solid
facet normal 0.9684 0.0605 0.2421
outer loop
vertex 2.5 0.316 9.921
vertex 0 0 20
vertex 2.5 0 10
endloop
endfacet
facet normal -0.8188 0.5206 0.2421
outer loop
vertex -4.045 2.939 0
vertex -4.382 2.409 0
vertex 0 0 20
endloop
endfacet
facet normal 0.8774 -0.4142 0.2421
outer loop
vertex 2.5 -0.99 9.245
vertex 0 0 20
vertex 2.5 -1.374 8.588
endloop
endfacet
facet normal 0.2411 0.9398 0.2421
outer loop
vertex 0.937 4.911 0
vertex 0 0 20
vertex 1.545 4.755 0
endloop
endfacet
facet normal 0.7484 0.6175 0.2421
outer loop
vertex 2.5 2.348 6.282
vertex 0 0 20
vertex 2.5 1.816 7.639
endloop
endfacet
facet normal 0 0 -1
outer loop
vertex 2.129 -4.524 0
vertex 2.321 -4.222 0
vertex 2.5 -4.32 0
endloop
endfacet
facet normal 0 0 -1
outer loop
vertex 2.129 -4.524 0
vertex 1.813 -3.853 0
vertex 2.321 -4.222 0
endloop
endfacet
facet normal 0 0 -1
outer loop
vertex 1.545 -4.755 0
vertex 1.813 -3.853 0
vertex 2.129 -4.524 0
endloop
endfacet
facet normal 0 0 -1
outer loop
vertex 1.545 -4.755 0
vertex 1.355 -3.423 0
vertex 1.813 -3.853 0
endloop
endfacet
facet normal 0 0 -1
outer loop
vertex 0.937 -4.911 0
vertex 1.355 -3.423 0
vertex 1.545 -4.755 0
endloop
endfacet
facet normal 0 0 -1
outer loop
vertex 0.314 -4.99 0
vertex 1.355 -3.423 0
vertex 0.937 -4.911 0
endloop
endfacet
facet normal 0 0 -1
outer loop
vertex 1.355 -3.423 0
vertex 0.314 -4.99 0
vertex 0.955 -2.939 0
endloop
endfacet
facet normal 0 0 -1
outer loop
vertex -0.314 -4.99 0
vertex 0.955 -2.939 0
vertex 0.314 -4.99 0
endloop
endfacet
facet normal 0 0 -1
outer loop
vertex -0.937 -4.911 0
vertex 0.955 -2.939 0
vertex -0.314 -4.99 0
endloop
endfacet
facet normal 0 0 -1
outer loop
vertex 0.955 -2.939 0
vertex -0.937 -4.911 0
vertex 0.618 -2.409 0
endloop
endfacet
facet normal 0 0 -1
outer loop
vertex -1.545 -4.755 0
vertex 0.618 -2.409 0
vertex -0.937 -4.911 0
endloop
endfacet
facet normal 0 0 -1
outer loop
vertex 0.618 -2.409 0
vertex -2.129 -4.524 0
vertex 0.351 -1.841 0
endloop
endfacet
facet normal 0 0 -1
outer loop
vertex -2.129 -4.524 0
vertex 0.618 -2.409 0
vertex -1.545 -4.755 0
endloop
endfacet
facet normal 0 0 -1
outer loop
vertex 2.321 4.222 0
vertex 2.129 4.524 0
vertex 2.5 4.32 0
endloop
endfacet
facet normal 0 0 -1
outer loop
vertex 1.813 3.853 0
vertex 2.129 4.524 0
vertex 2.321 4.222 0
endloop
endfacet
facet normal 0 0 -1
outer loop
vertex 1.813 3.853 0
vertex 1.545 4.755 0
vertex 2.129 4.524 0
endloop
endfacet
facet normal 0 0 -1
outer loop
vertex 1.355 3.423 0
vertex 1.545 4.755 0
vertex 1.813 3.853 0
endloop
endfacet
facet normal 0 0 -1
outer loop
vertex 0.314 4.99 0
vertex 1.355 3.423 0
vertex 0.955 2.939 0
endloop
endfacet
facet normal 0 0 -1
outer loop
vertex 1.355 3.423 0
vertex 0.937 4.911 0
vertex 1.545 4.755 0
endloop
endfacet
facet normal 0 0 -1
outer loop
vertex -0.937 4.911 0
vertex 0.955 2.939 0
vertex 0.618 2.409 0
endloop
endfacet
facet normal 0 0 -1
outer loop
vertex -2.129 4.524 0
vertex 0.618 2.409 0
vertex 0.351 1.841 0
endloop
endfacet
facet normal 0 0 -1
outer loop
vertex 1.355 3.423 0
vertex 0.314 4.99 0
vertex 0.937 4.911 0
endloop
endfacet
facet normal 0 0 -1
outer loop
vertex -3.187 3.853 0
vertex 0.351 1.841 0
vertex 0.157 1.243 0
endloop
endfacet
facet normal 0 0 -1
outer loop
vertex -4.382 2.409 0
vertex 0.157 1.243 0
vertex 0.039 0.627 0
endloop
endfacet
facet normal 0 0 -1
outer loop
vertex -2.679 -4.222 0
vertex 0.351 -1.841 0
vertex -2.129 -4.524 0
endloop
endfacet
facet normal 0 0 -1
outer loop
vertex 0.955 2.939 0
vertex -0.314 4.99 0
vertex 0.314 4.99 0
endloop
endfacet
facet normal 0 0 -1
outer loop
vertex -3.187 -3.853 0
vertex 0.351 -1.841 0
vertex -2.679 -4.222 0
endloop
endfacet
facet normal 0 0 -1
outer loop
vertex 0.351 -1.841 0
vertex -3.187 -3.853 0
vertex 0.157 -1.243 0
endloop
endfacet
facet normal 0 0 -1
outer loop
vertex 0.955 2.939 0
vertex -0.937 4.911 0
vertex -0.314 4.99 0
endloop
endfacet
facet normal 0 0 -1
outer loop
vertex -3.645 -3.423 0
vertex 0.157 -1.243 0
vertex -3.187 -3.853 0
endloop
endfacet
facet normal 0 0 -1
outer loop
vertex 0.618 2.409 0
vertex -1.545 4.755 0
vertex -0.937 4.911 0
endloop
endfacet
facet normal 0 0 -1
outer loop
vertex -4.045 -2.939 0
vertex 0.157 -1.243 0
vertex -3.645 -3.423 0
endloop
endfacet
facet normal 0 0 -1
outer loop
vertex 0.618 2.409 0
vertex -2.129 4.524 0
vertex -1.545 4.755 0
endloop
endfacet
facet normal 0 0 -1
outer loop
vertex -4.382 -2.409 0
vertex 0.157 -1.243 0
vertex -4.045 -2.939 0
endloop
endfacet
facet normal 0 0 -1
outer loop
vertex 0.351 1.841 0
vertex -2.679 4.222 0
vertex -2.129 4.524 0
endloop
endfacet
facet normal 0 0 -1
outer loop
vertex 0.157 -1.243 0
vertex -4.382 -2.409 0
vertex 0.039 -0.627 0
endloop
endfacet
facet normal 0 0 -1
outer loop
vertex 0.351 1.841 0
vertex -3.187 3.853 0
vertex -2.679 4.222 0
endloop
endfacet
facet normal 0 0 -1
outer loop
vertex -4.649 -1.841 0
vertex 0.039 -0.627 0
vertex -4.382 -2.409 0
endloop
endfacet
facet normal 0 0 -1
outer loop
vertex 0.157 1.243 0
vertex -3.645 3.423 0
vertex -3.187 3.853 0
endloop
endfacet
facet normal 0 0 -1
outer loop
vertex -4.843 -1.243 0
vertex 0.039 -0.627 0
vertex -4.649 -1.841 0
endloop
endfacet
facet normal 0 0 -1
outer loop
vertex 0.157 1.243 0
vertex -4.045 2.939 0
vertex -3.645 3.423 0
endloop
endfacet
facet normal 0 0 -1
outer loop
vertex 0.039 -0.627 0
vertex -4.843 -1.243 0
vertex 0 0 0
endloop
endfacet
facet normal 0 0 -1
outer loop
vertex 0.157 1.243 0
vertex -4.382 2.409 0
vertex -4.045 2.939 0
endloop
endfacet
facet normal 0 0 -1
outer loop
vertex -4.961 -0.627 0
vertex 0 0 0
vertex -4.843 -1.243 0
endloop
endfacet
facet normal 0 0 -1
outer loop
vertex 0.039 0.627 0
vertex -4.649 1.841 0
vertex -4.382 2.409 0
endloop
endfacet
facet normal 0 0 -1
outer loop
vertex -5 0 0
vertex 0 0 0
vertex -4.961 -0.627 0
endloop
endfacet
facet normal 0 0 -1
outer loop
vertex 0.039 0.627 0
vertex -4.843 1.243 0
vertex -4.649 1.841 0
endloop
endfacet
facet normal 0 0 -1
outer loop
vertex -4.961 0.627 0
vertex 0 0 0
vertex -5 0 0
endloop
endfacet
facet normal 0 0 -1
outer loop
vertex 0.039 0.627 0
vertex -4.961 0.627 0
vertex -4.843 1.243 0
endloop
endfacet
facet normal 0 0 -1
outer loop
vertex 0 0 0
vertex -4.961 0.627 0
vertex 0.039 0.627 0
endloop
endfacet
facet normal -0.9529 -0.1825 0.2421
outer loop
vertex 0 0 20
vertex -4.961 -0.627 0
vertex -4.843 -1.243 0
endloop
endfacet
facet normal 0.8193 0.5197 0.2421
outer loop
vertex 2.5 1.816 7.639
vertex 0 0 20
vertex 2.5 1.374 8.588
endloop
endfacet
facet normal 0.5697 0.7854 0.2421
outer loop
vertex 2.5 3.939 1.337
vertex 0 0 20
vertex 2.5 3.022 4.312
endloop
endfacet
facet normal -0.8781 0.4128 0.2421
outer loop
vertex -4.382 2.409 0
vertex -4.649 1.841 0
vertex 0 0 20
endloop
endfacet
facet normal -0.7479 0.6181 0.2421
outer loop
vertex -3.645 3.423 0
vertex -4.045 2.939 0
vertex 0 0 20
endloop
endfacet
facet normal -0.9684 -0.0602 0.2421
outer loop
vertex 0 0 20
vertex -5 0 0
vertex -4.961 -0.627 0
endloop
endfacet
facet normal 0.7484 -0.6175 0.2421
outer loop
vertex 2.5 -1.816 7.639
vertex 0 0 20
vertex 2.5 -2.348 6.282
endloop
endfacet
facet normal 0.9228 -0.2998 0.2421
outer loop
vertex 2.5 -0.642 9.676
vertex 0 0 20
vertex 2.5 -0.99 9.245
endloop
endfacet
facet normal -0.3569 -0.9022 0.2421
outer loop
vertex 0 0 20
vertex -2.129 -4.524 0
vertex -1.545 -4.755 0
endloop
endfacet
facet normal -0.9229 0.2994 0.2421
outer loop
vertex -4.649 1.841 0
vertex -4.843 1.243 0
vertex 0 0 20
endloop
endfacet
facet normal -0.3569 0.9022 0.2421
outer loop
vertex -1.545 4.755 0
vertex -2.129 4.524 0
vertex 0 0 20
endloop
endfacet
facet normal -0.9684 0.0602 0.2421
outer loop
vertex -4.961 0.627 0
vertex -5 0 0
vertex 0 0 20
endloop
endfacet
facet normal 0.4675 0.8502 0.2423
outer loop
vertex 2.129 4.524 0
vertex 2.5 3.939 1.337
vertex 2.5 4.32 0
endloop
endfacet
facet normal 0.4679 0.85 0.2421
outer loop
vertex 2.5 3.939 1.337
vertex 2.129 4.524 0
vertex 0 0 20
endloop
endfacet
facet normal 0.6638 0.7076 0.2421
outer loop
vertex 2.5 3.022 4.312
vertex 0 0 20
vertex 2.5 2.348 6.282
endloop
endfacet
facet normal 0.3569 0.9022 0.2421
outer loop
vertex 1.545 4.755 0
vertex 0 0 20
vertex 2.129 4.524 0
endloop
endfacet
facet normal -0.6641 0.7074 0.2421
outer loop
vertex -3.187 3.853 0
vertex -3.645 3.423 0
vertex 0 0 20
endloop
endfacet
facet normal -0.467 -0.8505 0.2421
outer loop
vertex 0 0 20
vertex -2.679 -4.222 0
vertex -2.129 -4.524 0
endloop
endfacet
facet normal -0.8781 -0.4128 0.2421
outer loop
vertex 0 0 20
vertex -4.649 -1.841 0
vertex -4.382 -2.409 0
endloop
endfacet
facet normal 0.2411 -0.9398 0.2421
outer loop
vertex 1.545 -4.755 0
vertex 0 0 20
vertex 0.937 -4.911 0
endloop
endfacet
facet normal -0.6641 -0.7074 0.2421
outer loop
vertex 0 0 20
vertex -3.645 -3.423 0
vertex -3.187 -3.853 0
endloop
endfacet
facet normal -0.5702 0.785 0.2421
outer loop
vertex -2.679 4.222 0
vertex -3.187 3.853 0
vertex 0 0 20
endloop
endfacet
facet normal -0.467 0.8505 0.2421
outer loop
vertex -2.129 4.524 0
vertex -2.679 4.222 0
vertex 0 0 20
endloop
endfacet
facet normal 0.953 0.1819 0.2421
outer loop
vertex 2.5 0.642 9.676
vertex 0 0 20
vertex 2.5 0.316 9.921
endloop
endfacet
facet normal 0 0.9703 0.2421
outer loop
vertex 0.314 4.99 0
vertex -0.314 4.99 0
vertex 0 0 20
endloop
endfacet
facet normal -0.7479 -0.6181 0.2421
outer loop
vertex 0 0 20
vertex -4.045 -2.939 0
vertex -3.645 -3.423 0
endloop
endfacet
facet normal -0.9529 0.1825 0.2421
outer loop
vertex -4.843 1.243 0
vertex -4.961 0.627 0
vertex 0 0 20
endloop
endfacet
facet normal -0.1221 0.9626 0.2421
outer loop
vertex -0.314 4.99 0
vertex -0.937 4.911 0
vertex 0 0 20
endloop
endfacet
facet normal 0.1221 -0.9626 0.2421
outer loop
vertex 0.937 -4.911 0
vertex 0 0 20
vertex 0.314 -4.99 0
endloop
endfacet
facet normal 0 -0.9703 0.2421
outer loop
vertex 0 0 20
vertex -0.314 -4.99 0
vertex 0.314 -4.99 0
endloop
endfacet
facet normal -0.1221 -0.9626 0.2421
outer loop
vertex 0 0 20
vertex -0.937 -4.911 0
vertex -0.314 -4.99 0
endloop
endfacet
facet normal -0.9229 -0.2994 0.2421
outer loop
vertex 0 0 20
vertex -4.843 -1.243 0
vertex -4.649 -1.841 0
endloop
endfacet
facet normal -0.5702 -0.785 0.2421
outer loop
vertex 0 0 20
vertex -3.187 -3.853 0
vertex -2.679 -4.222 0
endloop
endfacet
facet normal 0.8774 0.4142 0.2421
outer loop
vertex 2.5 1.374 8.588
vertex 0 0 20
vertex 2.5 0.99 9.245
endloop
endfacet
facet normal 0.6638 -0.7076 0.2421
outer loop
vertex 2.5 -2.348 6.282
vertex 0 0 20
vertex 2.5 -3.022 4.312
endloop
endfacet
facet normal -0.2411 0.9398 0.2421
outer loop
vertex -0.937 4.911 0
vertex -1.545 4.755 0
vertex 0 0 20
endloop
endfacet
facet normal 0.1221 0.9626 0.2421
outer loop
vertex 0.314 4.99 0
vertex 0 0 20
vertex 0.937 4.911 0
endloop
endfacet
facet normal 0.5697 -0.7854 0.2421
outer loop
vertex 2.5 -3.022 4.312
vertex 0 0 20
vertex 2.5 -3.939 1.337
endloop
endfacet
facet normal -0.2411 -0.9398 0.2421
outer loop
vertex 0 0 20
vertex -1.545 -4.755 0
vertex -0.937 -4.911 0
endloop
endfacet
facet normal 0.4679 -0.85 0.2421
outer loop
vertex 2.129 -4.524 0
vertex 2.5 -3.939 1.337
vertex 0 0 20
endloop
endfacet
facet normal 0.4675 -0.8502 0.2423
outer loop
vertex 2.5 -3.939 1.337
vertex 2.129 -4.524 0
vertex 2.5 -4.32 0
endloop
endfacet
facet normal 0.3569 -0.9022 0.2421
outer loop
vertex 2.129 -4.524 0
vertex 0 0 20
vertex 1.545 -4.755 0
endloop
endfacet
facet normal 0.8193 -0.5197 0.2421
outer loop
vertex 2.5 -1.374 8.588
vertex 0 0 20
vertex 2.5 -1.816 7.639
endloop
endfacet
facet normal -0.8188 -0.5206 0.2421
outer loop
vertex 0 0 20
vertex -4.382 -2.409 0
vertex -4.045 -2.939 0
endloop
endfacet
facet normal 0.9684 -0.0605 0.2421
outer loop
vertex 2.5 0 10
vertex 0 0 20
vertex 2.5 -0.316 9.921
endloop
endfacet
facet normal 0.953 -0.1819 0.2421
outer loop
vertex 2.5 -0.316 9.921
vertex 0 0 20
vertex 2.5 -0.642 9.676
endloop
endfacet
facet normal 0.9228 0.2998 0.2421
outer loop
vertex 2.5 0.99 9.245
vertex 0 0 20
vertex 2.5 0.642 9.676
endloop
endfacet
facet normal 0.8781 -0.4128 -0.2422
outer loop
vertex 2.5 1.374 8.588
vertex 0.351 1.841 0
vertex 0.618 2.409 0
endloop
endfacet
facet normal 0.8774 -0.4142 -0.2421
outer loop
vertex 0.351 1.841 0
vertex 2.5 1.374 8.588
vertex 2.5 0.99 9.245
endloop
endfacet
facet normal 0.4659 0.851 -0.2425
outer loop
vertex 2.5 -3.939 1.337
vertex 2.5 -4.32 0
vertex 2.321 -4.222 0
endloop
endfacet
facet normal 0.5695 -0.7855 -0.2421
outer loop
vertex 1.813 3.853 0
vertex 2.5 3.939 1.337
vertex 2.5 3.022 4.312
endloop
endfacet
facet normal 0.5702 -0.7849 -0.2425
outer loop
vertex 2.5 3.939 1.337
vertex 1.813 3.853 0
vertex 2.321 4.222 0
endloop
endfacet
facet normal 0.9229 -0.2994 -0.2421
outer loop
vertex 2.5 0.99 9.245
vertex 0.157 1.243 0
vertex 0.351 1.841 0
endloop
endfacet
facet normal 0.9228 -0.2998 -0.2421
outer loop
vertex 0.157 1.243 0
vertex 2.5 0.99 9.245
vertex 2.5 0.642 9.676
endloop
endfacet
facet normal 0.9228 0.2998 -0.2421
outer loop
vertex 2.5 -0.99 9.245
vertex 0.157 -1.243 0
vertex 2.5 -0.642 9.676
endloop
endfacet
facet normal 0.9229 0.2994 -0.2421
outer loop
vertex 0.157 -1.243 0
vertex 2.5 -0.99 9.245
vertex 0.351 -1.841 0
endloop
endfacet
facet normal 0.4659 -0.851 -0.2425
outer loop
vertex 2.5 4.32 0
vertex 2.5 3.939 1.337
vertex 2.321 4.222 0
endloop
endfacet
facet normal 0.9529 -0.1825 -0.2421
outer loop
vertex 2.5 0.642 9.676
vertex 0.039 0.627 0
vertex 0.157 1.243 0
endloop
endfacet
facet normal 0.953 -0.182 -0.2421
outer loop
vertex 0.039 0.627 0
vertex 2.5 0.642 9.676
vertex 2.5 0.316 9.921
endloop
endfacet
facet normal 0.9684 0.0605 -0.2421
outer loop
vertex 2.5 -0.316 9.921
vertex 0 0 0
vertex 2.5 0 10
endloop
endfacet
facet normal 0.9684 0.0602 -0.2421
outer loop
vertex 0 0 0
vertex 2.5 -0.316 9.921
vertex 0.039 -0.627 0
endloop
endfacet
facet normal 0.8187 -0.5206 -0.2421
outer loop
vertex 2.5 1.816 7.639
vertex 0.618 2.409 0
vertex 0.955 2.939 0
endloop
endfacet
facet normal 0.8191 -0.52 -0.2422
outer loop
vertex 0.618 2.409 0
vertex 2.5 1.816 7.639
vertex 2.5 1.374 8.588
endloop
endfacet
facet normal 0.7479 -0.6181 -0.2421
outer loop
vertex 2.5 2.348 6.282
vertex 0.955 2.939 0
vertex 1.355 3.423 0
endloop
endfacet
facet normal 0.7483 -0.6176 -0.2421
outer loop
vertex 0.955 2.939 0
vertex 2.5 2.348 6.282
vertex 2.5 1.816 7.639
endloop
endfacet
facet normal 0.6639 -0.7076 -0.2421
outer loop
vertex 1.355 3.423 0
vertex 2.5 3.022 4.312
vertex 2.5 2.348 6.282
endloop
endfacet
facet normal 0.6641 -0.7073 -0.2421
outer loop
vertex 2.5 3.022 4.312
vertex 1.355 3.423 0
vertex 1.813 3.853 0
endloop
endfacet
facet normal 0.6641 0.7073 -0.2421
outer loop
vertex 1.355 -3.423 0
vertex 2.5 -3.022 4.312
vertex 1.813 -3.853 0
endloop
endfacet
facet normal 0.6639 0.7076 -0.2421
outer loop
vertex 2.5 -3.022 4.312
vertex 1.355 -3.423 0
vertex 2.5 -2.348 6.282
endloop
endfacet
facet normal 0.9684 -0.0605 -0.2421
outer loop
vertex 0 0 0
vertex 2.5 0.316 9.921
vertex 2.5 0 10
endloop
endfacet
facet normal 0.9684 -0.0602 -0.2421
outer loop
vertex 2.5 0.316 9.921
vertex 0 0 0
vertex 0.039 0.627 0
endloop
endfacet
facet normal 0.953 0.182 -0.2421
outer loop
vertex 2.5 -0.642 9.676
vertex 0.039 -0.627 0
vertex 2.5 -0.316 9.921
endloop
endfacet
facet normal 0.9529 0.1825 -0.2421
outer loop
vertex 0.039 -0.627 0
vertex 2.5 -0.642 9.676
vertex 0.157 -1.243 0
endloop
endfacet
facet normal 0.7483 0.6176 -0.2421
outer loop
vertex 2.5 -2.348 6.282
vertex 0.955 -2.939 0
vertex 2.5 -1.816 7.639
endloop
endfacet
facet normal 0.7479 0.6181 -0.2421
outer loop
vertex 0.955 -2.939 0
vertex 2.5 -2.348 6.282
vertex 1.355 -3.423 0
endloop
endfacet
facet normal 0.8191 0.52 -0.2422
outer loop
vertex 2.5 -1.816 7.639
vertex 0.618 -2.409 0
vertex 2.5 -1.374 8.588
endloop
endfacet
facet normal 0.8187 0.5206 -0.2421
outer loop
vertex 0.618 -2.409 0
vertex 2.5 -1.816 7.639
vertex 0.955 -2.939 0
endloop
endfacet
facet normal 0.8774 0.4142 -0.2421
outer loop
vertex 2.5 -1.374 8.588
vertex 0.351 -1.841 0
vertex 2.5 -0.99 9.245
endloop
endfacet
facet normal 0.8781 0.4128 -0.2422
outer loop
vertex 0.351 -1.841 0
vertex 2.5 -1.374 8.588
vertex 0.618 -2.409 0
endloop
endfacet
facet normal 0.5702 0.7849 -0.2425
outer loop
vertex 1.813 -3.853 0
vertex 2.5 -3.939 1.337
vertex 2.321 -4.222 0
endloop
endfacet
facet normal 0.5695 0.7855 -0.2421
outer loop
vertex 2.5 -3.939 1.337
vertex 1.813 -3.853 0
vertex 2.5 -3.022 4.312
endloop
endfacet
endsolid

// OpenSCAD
$fn=50;
difference() {
    cylinder(h=20, r1=5, r2=0);
    translate([5, 0, 0]) cylinder(h=20, r1=5, r2=0);
}
